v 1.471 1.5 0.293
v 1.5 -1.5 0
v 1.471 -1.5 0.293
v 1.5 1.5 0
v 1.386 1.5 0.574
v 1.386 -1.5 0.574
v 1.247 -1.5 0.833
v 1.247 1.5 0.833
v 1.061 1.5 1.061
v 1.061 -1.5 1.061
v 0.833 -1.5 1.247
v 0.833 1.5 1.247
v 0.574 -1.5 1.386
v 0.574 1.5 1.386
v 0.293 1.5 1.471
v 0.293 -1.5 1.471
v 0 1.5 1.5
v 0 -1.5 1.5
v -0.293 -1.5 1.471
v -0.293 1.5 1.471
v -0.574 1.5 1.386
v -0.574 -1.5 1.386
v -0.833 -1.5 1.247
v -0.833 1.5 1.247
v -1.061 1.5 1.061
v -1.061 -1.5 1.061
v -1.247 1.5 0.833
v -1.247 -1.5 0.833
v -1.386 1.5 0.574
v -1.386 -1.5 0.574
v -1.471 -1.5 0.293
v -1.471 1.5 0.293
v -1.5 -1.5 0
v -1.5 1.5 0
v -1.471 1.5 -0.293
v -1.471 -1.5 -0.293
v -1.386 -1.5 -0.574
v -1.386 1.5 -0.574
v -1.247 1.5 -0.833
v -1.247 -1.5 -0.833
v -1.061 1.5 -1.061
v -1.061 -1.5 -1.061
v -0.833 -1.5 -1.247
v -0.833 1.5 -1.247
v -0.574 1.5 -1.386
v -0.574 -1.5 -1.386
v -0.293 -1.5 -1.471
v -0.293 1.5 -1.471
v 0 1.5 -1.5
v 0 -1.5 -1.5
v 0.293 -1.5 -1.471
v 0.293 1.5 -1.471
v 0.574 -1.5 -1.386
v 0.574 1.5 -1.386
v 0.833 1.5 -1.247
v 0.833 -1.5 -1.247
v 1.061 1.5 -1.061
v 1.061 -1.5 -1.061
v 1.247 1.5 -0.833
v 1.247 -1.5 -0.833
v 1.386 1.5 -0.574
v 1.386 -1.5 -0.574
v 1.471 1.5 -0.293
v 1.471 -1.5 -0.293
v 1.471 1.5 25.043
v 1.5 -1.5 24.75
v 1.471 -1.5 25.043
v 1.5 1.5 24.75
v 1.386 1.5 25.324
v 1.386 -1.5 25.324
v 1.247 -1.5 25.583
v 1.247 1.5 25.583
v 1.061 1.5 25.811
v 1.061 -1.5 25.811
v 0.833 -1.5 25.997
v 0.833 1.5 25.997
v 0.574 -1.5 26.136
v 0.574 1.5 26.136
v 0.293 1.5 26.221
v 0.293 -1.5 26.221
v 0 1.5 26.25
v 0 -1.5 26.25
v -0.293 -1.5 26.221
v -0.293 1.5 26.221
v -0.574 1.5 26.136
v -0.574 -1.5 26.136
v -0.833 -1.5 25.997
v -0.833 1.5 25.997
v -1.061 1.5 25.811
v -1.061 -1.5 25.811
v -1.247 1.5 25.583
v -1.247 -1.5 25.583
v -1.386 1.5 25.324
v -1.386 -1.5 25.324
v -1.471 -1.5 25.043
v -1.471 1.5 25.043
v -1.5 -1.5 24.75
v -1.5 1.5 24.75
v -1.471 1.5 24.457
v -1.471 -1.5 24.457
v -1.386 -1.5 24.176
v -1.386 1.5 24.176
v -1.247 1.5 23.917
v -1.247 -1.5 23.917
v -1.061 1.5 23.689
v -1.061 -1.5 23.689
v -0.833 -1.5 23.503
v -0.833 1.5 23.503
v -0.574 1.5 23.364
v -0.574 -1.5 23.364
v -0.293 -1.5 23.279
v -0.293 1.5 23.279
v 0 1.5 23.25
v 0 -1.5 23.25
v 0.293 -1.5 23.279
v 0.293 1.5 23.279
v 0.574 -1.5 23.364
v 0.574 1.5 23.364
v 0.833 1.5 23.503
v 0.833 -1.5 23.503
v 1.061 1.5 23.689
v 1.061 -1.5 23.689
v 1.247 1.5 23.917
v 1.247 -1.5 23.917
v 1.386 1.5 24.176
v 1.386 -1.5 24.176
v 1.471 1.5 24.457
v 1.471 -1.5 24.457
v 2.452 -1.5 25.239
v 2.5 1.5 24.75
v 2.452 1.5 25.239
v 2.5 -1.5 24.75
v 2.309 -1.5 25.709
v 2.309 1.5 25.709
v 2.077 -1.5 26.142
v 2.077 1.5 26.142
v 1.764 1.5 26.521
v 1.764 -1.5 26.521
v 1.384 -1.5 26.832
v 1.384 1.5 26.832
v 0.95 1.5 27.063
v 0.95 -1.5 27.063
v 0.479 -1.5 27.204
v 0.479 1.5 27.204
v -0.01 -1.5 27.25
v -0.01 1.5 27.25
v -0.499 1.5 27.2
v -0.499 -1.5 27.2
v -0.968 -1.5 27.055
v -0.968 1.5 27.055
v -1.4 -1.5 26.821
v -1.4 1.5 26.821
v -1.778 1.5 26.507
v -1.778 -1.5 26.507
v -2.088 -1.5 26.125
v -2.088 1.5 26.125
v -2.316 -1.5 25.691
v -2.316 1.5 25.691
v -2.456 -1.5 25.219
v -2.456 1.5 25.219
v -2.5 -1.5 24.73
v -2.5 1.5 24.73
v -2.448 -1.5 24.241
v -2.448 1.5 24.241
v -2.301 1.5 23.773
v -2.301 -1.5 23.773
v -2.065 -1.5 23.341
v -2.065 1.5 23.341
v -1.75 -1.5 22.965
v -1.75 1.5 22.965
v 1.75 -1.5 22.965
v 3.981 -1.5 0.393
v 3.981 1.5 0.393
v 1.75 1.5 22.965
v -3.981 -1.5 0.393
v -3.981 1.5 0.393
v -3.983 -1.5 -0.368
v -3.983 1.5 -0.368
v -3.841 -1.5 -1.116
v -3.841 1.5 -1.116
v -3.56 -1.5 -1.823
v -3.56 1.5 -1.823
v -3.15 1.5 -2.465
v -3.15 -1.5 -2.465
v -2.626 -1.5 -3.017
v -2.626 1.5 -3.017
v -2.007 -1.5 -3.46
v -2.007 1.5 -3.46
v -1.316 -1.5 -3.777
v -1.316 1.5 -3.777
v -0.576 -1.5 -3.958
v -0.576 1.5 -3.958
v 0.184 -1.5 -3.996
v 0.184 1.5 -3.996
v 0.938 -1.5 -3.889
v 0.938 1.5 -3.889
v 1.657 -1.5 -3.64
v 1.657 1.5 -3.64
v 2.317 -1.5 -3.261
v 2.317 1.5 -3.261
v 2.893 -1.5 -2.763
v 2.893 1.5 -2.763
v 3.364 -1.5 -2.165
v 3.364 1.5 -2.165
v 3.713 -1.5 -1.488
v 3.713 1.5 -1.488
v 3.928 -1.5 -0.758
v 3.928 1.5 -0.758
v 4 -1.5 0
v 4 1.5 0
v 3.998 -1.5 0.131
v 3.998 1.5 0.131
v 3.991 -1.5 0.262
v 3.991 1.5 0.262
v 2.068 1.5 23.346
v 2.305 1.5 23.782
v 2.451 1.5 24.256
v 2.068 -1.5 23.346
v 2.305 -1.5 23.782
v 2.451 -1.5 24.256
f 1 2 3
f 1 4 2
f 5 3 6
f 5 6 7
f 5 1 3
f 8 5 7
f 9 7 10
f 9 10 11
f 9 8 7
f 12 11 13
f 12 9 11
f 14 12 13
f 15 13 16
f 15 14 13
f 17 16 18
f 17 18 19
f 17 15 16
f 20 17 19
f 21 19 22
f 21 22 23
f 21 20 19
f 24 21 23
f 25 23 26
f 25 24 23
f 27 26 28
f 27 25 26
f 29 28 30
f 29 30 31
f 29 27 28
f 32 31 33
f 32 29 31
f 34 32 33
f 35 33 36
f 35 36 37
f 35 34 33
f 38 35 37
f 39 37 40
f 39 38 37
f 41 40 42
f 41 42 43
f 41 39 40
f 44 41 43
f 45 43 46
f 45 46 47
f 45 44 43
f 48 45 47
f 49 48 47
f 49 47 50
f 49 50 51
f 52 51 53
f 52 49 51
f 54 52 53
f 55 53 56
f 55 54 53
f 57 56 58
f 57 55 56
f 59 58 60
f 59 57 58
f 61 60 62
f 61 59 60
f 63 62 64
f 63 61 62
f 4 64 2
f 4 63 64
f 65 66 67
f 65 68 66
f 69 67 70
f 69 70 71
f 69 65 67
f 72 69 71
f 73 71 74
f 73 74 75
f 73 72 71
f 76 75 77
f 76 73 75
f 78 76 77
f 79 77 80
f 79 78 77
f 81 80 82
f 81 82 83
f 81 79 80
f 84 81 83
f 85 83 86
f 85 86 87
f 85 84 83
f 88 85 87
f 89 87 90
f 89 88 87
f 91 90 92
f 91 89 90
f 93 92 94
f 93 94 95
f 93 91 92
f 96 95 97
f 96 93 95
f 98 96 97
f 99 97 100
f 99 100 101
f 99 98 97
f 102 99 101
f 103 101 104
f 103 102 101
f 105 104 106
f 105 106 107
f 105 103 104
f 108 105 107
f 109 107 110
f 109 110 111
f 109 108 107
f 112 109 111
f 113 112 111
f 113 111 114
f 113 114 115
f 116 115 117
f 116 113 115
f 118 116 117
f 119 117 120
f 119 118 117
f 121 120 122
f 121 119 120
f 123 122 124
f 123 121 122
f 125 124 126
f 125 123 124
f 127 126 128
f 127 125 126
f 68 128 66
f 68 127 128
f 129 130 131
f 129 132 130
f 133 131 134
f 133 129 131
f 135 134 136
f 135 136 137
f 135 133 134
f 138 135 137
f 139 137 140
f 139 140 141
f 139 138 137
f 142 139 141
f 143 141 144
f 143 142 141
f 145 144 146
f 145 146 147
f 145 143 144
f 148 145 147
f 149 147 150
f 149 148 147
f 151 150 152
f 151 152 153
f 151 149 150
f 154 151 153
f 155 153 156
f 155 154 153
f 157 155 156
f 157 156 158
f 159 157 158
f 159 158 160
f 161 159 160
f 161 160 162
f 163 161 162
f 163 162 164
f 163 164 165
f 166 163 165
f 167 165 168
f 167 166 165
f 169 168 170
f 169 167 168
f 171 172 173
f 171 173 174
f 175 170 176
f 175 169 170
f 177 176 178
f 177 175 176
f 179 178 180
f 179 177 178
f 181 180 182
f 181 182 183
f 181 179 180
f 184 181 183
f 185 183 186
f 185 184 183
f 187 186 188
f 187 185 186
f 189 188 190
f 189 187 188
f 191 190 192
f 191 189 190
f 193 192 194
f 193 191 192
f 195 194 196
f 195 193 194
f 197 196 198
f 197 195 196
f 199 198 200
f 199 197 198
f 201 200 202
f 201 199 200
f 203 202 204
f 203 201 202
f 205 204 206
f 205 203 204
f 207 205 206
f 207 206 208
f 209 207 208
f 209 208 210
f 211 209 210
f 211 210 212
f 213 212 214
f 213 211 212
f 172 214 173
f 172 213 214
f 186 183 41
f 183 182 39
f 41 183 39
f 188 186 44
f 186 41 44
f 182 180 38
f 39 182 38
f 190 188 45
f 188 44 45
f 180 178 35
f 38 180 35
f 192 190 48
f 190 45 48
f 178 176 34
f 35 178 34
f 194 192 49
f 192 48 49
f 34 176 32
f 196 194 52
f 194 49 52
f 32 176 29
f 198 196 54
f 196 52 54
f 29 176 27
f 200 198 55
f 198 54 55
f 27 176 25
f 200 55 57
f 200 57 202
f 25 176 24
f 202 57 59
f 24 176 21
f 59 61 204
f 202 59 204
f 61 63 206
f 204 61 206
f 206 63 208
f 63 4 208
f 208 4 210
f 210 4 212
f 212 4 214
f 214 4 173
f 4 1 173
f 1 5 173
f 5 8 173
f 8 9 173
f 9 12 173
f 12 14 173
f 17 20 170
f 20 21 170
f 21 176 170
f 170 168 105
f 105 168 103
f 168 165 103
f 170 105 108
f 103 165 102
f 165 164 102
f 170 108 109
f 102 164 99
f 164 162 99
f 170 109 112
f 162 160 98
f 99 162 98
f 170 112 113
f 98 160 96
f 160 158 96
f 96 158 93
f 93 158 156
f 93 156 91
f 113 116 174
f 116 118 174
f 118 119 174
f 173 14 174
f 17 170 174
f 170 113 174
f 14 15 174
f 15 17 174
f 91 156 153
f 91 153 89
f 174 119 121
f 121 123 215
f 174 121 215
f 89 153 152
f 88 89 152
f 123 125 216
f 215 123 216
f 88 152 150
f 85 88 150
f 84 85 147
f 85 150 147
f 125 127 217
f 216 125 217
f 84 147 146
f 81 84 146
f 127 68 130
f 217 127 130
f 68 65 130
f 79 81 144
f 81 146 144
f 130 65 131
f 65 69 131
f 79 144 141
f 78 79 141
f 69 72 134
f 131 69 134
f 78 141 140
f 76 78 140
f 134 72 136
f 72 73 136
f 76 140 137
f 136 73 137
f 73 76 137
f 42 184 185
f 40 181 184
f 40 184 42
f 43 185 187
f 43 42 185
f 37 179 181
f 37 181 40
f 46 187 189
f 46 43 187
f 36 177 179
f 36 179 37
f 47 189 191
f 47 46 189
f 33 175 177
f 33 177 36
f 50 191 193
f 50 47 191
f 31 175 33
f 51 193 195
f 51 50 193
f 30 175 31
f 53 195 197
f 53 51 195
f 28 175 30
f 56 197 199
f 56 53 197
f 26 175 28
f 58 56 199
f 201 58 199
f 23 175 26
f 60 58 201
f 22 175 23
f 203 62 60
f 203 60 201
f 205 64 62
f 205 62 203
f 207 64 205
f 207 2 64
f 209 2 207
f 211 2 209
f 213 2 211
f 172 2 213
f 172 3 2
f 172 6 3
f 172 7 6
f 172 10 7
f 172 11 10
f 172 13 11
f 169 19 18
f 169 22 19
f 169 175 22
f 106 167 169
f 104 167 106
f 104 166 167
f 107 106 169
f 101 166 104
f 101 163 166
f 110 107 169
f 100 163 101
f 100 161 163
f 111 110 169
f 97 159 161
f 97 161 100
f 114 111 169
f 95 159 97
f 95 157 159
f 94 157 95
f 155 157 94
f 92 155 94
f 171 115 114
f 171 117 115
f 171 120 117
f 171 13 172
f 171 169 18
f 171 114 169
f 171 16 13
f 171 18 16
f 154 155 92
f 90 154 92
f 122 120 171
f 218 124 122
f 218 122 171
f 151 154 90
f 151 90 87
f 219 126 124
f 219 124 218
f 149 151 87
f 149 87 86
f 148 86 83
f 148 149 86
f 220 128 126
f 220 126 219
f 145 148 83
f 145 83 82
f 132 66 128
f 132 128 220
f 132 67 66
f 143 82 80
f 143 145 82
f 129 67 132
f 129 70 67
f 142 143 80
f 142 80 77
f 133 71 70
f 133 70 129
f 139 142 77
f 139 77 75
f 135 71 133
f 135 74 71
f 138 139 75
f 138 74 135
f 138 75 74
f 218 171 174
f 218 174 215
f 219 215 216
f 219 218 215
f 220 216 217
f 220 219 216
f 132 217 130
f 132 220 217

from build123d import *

# Parameters (mm, degrees)
F0_R     = 1.5
F1_DEPTH = 1.5


with BuildPart() as f1:
    # F0 (on Front) → F1 (new body, symmetric)
    with BuildSketch(Plane.XZ):
        with BuildLine():
            ThreePointArc((-3.980609, 0.393384), (-0.196931, -3.995149), (4, 0))
            ThreePointArc((4, 0), (3.995149, 0.196931), (3.980609, 0.393384))
            ThreePointArc((3.980609, 0.393384), (0, 4), (-3.980609, 0.393384))
        make_face()
        Circle(F0_R, mode=Mode.SUBTRACT)
        with BuildLine():
            ThreePointArc((-3.980609, 0.393384), (0, 4), (3.980609, 0.393384))
            Line((3.980609, 0.393384), (1.75, 22.964643))
            ThreePointArc((1.75, 22.964643), (0, 22.25), (-1.75, 22.964643))
            Line((-1.75, 22.964643), (-3.980609, 0.393384))
        make_face()
        with BuildLine():
            ThreePointArc((-1.75, 22.964643), (0, 22.25), (1.75, 22.964643))
            ThreePointArc((1.75, 22.964643), (2.304886, 23.781754), (2.5, 24.75))
            ThreePointArc((2.5, 24.75), (-0.968246, 27.054886), (-1.75, 22.964643))
        make_face()
        with Locations((0, 24.75)):
            Circle(F0_R, mode=Mode.SUBTRACT)
    extrude(amount=F1_DEPTH, both=True)


solid = f1.part
